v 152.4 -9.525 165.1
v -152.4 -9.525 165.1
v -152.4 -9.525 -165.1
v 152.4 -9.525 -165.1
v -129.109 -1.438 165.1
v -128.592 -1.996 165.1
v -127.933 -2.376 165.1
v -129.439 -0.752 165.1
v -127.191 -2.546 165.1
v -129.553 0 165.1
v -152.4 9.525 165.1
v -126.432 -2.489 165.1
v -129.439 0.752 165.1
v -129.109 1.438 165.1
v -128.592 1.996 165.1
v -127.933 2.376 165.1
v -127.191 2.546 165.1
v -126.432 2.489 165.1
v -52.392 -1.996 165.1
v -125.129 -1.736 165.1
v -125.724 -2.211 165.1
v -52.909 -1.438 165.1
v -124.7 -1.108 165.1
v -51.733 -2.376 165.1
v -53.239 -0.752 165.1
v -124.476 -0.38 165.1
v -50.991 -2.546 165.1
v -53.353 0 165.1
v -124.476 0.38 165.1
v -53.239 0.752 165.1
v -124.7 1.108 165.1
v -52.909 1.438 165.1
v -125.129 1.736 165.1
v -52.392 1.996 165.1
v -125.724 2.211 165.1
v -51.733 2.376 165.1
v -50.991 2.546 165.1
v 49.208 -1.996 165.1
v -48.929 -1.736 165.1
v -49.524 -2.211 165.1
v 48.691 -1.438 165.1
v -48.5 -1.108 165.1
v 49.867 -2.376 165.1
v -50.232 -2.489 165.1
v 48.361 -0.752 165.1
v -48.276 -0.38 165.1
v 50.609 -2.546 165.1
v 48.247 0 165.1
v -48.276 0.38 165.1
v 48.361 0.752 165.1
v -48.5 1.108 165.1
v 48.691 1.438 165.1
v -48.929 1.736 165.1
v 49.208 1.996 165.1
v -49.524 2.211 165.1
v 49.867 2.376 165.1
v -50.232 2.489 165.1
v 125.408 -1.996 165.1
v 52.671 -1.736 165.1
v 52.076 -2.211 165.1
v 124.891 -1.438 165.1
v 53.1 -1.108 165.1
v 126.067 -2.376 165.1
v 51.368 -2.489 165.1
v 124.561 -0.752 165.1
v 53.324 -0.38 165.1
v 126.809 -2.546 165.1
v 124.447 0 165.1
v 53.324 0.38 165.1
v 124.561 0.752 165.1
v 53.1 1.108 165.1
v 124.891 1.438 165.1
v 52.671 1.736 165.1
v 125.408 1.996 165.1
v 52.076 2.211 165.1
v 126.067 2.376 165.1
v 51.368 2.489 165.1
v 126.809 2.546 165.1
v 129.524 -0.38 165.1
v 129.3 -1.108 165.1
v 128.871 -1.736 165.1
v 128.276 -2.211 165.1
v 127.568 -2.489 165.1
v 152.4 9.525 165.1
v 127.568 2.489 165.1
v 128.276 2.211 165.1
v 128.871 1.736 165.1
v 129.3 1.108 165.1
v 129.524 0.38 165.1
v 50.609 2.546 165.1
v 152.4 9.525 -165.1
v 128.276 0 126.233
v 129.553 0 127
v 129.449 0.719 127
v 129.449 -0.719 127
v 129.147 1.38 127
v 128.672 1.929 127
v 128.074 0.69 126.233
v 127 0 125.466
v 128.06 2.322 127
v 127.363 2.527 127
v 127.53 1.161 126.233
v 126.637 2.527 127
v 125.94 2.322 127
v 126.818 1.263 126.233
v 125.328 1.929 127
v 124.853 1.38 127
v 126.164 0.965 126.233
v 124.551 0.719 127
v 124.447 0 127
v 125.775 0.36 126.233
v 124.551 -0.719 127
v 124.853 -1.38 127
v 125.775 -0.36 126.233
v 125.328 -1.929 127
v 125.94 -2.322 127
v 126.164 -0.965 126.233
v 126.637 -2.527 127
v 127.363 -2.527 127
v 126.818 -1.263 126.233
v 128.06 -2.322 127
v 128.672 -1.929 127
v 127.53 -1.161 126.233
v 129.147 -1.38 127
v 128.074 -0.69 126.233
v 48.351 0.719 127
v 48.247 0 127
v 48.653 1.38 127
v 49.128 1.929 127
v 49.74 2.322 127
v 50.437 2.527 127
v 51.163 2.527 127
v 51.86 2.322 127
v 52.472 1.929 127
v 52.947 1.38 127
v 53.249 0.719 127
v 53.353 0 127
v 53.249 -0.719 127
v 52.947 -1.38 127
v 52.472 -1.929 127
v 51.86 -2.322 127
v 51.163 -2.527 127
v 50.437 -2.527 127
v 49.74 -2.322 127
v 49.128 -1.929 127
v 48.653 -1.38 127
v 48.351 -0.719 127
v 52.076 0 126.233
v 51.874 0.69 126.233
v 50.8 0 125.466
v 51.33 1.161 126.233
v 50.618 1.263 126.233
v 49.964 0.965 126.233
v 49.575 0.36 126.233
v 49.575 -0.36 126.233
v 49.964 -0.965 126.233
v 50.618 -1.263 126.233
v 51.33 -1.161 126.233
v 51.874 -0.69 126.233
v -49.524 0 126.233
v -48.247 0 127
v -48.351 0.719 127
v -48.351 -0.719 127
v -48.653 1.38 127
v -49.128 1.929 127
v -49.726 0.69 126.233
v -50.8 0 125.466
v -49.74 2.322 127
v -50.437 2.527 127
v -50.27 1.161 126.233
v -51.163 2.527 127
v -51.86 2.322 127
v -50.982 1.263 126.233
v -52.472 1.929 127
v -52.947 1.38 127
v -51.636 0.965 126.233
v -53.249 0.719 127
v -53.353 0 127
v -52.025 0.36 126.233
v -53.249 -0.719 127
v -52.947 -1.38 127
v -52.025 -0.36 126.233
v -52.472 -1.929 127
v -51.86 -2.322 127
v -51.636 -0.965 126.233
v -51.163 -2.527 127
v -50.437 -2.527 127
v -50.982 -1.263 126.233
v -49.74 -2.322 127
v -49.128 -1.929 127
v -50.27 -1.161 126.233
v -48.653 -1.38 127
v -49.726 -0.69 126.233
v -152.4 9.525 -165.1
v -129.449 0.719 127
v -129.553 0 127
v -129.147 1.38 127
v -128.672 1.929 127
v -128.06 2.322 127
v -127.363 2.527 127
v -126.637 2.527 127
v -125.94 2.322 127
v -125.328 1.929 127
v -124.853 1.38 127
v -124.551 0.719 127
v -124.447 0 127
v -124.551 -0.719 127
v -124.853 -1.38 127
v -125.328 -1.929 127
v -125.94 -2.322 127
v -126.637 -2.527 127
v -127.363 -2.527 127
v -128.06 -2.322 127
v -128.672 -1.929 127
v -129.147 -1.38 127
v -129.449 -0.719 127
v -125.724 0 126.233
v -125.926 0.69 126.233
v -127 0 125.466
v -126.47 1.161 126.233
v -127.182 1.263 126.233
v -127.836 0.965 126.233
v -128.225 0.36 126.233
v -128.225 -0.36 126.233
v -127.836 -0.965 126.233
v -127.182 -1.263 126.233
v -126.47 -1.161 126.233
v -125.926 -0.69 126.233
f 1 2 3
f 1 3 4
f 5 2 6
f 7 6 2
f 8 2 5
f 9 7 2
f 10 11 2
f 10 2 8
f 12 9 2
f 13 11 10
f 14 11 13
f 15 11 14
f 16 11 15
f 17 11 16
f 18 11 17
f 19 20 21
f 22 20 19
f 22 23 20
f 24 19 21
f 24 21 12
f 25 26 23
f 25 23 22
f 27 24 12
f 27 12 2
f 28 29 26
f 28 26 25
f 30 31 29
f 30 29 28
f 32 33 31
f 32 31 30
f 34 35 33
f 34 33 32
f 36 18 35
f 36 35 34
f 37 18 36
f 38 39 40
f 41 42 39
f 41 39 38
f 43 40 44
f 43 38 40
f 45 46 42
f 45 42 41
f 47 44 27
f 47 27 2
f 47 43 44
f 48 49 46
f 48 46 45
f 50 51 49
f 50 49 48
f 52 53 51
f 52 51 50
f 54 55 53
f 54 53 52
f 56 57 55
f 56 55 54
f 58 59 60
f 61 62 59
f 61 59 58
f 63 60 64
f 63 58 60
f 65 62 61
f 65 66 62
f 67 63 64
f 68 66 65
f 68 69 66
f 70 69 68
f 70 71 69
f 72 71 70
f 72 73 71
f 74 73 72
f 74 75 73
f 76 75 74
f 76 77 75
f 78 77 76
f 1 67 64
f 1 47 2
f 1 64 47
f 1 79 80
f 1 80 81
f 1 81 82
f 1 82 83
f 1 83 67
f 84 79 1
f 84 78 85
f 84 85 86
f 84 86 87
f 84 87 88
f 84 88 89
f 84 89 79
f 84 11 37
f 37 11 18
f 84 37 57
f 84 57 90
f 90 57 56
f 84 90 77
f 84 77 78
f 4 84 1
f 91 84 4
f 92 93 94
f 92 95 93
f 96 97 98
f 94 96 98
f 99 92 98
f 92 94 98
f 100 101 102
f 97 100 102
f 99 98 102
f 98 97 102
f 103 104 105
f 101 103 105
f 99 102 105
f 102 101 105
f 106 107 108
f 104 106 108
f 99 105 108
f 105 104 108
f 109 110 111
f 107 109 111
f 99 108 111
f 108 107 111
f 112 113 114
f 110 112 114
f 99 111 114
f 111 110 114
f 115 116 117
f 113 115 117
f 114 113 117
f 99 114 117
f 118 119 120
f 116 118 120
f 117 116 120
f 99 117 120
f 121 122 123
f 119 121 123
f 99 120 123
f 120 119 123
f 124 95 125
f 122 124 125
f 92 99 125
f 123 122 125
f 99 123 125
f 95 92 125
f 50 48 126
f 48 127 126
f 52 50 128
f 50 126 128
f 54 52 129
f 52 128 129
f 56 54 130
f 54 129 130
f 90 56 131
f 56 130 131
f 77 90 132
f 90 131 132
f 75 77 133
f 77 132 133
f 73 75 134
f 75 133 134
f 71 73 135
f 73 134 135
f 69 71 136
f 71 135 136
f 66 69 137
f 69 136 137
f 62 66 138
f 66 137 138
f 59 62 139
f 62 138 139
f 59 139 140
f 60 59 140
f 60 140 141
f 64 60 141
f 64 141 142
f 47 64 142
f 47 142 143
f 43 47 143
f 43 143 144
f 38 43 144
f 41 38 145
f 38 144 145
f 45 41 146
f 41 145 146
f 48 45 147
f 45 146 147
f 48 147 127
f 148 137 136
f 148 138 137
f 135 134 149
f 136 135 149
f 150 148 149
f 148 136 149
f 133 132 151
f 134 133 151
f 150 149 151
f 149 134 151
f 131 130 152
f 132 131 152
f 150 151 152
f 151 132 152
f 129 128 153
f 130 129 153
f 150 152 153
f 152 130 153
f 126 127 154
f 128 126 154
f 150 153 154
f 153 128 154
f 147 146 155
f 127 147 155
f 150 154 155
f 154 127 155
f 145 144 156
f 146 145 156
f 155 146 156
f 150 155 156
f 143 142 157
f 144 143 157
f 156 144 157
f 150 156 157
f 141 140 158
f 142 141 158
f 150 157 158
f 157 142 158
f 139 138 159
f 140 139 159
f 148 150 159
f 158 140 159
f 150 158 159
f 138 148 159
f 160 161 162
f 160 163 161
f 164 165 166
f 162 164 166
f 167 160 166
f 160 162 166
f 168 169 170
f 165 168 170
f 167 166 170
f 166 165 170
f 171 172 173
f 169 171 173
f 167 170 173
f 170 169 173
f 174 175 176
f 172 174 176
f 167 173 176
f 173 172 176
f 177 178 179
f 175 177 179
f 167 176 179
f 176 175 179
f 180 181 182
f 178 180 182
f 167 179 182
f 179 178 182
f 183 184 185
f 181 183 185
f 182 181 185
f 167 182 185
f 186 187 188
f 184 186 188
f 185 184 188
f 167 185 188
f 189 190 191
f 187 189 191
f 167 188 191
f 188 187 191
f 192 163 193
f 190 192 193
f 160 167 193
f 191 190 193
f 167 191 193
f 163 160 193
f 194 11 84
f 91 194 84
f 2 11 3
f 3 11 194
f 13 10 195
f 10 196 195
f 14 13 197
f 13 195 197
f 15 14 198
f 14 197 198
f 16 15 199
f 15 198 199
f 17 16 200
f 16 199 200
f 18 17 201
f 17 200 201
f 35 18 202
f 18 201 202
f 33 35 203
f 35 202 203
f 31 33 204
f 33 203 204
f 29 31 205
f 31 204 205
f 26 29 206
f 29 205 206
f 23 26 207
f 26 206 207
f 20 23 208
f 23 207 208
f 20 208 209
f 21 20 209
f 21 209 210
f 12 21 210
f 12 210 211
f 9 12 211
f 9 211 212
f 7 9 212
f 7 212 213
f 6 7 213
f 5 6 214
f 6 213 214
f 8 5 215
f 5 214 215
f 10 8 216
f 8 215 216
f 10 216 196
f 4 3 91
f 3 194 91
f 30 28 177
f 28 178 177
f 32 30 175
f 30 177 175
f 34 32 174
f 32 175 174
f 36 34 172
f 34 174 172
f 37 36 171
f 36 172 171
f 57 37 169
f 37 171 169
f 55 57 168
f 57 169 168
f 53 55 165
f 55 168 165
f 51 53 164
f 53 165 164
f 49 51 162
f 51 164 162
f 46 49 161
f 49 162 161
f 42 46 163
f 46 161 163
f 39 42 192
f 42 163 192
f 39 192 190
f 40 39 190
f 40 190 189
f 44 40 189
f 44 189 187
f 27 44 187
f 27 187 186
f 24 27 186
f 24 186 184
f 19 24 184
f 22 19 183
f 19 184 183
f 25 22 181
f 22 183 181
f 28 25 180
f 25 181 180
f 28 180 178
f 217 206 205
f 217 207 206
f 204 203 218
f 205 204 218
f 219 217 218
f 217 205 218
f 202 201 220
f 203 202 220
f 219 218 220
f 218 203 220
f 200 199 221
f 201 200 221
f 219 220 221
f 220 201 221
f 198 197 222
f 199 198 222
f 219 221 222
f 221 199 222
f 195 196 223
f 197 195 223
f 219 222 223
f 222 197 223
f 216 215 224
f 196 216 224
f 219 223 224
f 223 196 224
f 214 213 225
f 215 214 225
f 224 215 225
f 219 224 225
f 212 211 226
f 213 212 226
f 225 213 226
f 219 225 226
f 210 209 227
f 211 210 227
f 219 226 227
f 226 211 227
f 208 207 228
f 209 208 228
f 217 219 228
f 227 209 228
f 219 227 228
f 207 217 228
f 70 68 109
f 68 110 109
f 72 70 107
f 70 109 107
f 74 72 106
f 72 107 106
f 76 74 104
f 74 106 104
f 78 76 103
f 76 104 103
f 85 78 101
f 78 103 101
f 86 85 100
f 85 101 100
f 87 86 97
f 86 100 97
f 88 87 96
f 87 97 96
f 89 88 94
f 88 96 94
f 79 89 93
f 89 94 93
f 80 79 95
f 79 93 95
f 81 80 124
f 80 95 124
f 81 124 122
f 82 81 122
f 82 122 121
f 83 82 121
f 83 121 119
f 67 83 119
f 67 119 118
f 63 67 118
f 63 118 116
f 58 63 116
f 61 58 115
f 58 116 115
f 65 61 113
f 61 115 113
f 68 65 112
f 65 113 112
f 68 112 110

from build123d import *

# Parameters (mm, degrees)
SKETCH2_W                   = 304.8
SKETCH2_H                   = 330.2
BOSS_EXTRUDE1_DEPTH         = 9.525
F_1_4_20_TAPPED_HOLE1_D     = 5.1054
F_1_4_20_TAPPED_HOLE1_DEPTH = 38.1
F_1_4_20_TAPPED_HOLE1_TIP   = 1.533816902


with BuildPart() as part:
    # Sketch2 → Boss-Extrude1 (new, symmetric)
    with BuildSketch(Plane(origin=(0, 0, 0), x_dir=(1, 0, 0), z_dir=(0, 1, 0))):
        Rectangle(SKETCH2_W, SKETCH2_H)
    extrude(amount=BOSS_EXTRUDE1_DEPTH, both=True)

    # 1/4-20 Tapped Hole1
    with Locations(Plane.XY.offset(165.1)):
        with Locations((127, 0), (50.8, 0), (-50.8, 0), (-127, 0)):
            Hole(F_1_4_20_TAPPED_HOLE1_D / 2, depth=F_1_4_20_TAPPED_HOLE1_DEPTH)
            with Locations((0, 0, -(F_1_4_20_TAPPED_HOLE1_DEPTH + F_1_4_20_TAPPED_HOLE1_TIP / 2))):  # 118° drill point
                Cone(0, F_1_4_20_TAPPED_HOLE1_D / 2, F_1_4_20_TAPPED_HOLE1_TIP, mode=Mode.SUBTRACT)


solid = part.part
